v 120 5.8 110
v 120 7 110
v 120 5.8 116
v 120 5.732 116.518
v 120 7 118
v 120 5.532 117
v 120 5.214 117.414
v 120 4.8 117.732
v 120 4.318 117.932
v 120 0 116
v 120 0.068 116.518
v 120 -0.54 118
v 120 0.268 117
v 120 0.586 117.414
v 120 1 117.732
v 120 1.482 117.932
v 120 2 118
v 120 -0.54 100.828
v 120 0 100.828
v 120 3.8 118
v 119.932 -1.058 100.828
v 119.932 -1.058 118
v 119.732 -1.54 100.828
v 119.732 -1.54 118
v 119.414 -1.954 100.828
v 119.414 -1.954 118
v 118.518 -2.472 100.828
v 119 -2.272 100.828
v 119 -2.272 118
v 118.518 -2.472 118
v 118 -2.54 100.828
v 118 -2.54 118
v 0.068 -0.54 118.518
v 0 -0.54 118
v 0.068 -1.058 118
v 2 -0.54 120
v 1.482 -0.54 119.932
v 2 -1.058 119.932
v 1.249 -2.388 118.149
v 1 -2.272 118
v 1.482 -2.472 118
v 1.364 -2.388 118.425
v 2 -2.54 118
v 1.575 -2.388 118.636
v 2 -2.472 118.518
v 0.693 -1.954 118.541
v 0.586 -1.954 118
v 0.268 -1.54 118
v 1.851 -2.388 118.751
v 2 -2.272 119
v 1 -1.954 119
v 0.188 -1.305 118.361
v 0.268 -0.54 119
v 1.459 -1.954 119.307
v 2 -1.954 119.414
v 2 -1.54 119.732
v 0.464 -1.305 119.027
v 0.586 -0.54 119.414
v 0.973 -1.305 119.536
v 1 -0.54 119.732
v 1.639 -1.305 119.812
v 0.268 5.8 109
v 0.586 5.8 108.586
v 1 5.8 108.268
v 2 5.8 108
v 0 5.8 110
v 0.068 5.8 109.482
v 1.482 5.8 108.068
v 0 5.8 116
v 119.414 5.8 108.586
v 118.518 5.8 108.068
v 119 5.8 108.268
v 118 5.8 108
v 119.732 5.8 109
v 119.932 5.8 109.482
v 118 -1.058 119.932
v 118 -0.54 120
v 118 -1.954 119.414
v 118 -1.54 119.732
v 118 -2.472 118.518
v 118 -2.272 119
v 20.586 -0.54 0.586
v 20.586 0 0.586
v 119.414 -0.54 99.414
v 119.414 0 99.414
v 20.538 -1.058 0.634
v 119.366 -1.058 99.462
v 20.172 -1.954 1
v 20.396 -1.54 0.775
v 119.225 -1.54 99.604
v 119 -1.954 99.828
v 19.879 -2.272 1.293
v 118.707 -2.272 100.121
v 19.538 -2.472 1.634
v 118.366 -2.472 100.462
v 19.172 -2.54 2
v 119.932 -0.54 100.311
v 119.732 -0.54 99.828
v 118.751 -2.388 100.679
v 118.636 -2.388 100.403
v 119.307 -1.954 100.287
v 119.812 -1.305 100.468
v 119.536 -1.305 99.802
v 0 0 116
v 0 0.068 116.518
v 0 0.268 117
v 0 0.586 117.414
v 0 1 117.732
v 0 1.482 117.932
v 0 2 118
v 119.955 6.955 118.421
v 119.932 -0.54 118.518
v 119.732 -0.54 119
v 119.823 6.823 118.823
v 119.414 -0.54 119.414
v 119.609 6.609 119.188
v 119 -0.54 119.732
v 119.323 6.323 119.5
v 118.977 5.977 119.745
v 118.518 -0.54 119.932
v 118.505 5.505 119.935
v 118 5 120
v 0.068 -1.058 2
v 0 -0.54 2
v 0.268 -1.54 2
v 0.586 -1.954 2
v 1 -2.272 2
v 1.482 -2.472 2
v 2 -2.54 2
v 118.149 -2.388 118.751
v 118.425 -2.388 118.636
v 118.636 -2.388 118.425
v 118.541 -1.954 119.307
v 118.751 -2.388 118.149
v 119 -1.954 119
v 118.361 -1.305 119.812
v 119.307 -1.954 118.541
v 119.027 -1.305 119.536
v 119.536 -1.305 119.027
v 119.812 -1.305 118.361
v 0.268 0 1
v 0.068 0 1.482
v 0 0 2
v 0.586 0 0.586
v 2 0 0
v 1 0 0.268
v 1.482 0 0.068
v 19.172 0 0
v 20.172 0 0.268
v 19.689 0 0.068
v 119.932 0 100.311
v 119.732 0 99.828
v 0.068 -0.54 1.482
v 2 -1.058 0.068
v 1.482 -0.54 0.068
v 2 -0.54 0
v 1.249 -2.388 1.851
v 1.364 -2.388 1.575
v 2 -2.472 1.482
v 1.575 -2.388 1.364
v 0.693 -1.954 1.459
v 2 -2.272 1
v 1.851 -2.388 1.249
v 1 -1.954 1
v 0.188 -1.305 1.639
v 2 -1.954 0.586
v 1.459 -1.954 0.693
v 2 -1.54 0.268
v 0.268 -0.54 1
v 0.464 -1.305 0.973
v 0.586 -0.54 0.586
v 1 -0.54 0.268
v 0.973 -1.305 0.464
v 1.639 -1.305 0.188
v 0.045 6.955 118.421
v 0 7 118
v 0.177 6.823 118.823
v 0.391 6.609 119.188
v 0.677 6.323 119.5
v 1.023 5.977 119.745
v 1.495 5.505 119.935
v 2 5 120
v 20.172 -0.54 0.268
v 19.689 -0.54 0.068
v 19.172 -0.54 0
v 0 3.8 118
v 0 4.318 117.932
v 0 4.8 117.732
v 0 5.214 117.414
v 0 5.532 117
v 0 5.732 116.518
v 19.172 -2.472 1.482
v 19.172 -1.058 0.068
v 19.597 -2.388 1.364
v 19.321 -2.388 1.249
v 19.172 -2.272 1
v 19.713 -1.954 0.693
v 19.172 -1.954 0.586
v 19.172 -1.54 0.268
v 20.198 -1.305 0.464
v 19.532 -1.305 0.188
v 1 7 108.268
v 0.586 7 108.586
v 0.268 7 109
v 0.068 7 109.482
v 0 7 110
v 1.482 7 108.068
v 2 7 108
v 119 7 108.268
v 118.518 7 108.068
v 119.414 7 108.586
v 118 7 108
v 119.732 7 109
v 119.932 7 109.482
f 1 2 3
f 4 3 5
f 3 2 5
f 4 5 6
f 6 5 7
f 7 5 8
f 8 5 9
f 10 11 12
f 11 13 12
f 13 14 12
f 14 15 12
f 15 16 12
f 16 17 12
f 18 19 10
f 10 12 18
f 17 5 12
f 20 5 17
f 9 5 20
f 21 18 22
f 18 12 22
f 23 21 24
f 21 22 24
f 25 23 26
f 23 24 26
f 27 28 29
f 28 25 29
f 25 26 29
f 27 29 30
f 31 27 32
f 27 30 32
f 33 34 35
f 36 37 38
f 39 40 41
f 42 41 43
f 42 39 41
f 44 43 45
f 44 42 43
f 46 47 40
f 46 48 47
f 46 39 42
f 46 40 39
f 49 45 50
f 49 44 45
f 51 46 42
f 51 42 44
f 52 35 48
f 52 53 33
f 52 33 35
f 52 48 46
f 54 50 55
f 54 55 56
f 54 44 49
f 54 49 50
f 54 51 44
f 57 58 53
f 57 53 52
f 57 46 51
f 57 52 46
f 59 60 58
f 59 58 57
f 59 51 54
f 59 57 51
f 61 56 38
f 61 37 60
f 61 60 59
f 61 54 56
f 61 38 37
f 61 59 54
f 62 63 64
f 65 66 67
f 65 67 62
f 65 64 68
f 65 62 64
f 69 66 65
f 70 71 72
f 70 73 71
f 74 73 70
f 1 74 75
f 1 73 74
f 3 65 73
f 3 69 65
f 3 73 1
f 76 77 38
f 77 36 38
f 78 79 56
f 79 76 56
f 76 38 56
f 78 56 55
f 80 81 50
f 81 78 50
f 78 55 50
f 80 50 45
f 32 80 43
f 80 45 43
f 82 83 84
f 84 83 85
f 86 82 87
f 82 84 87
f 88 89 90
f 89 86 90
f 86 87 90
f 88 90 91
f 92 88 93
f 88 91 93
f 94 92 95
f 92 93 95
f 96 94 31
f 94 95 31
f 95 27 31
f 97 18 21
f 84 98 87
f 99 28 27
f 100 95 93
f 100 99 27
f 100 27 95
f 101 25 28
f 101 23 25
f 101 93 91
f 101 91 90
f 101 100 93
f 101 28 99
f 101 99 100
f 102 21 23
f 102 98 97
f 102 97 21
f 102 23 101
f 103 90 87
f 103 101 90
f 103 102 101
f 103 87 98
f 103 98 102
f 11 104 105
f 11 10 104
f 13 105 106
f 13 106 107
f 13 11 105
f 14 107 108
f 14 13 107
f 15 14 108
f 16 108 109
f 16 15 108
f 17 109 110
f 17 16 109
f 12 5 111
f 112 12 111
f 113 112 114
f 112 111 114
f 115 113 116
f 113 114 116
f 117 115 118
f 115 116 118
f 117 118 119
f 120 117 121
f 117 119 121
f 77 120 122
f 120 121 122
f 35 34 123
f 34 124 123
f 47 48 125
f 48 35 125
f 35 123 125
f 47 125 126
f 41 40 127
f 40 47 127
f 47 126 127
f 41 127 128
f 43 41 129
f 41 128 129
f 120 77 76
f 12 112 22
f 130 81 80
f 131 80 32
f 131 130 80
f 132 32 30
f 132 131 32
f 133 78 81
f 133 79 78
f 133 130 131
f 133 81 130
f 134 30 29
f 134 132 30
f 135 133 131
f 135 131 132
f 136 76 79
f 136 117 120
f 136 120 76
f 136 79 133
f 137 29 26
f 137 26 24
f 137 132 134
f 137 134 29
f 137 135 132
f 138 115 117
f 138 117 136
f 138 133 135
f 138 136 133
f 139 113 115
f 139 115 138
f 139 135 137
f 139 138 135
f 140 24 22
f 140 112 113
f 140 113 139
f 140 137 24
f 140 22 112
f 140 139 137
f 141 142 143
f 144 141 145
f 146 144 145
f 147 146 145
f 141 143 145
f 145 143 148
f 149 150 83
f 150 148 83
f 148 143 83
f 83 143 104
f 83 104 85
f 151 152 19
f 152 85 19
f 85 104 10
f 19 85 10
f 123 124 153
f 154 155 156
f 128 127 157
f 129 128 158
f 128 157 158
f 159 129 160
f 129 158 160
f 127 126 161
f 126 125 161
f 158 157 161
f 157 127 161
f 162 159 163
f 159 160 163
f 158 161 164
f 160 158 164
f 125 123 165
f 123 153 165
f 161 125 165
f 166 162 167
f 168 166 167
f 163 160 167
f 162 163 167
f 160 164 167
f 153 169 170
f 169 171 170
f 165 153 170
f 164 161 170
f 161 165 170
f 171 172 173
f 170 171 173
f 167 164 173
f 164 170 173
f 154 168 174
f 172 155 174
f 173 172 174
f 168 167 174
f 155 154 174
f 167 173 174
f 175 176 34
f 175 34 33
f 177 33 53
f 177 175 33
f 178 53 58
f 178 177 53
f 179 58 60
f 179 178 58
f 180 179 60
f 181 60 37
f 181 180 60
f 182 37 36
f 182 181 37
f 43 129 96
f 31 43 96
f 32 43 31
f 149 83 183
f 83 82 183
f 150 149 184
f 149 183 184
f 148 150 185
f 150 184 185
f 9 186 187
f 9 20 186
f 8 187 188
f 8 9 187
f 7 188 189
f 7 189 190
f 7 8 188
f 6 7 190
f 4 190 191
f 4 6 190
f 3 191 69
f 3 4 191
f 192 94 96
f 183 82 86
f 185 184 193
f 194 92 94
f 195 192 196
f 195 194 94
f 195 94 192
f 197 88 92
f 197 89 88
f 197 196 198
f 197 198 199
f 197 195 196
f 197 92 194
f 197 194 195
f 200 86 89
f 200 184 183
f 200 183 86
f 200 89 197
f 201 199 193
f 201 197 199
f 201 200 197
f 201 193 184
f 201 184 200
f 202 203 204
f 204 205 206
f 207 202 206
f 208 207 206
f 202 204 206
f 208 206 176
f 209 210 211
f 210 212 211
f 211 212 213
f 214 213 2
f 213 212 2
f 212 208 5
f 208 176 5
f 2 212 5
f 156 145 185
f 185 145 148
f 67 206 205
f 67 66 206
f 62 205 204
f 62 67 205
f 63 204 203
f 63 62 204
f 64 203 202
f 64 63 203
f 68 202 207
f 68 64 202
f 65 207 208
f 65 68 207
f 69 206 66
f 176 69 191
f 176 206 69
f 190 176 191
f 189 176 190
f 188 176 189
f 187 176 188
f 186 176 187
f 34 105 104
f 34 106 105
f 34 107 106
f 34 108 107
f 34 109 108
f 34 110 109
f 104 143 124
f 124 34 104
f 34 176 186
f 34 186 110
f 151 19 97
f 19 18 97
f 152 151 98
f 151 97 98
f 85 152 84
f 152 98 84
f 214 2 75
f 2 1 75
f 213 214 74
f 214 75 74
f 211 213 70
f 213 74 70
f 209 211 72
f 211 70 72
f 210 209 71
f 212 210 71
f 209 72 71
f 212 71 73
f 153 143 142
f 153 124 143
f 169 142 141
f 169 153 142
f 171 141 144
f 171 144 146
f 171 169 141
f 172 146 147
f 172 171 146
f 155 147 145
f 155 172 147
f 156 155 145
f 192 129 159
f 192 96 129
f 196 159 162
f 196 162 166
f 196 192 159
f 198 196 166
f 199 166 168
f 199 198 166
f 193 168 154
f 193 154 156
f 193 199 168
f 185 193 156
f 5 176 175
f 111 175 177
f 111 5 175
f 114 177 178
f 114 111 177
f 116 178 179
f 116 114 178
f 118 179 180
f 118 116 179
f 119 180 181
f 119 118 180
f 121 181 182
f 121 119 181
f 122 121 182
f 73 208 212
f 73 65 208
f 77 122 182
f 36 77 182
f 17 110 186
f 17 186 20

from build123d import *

# Parameters (mm, degrees)
F1_W     = 120
F1_H     = 2
F2_DEPTH = 7
F3_DEPTH = 2.54
F4_W     = 120
F4_H     = 1.2
F5_DEPTH = 10
F6_R     = 1.9999


# Not quite as in the source:
# - a fillet or chamfer is up to 0.001 mm smaller than in the source, because OpenCascade refuses the exact size


with BuildPart() as f2:
    # F1 (on face) → F2 (new body)
    with BuildSketch(Plane.XZ):
        with Locations((60, 119)):
            Rectangle(F1_W, F1_H)
    extrude(amount=-F2_DEPTH)

    # F0 (on Front) → F3 (join)
    with BuildSketch(Plane.XZ):
        Polygon((0, 120), (0, 0), (20, 0), (120, 100), (120, 120), align=None)
    extrude(amount=F3_DEPTH)

    # F4 (on face) → F5 (join)
    with BuildSketch(Plane(origin=(0, 0, 118), x_dir=(1, 0, 0), z_dir=(0, 0, -1))):
        with Locations((60, -6.4)):
            Rectangle(F4_W, F4_H)
    extrude(amount=F5_DEPTH)

    # F6 (radius 2 in the source; OpenCascade refuses exactly that, so slightly less here)
    f6_edges = [f2.edges().sort_by_distance(p)[0] for p in [
        (0, -1.27, 0),
        (20, -1.27, 0),
        (120, -1.27, 100),
        (0, 2.23, 120),
        (120, 2.23, 120),
        (120, 6.4, 108),
        (0, 6.4, 108),
        (0, -2.54, 60),
        (60, -2.54, 120),
        (120, -2.54, 110),
        (70, -2.54, 50),
        (10, -2.54, 0),
        (60, 0, 118),
        (60, 5.8, 118),
        (60, 7, 120),
    ]]
    fillet(f6_edges, radius=F6_R)


solid = f2.part
